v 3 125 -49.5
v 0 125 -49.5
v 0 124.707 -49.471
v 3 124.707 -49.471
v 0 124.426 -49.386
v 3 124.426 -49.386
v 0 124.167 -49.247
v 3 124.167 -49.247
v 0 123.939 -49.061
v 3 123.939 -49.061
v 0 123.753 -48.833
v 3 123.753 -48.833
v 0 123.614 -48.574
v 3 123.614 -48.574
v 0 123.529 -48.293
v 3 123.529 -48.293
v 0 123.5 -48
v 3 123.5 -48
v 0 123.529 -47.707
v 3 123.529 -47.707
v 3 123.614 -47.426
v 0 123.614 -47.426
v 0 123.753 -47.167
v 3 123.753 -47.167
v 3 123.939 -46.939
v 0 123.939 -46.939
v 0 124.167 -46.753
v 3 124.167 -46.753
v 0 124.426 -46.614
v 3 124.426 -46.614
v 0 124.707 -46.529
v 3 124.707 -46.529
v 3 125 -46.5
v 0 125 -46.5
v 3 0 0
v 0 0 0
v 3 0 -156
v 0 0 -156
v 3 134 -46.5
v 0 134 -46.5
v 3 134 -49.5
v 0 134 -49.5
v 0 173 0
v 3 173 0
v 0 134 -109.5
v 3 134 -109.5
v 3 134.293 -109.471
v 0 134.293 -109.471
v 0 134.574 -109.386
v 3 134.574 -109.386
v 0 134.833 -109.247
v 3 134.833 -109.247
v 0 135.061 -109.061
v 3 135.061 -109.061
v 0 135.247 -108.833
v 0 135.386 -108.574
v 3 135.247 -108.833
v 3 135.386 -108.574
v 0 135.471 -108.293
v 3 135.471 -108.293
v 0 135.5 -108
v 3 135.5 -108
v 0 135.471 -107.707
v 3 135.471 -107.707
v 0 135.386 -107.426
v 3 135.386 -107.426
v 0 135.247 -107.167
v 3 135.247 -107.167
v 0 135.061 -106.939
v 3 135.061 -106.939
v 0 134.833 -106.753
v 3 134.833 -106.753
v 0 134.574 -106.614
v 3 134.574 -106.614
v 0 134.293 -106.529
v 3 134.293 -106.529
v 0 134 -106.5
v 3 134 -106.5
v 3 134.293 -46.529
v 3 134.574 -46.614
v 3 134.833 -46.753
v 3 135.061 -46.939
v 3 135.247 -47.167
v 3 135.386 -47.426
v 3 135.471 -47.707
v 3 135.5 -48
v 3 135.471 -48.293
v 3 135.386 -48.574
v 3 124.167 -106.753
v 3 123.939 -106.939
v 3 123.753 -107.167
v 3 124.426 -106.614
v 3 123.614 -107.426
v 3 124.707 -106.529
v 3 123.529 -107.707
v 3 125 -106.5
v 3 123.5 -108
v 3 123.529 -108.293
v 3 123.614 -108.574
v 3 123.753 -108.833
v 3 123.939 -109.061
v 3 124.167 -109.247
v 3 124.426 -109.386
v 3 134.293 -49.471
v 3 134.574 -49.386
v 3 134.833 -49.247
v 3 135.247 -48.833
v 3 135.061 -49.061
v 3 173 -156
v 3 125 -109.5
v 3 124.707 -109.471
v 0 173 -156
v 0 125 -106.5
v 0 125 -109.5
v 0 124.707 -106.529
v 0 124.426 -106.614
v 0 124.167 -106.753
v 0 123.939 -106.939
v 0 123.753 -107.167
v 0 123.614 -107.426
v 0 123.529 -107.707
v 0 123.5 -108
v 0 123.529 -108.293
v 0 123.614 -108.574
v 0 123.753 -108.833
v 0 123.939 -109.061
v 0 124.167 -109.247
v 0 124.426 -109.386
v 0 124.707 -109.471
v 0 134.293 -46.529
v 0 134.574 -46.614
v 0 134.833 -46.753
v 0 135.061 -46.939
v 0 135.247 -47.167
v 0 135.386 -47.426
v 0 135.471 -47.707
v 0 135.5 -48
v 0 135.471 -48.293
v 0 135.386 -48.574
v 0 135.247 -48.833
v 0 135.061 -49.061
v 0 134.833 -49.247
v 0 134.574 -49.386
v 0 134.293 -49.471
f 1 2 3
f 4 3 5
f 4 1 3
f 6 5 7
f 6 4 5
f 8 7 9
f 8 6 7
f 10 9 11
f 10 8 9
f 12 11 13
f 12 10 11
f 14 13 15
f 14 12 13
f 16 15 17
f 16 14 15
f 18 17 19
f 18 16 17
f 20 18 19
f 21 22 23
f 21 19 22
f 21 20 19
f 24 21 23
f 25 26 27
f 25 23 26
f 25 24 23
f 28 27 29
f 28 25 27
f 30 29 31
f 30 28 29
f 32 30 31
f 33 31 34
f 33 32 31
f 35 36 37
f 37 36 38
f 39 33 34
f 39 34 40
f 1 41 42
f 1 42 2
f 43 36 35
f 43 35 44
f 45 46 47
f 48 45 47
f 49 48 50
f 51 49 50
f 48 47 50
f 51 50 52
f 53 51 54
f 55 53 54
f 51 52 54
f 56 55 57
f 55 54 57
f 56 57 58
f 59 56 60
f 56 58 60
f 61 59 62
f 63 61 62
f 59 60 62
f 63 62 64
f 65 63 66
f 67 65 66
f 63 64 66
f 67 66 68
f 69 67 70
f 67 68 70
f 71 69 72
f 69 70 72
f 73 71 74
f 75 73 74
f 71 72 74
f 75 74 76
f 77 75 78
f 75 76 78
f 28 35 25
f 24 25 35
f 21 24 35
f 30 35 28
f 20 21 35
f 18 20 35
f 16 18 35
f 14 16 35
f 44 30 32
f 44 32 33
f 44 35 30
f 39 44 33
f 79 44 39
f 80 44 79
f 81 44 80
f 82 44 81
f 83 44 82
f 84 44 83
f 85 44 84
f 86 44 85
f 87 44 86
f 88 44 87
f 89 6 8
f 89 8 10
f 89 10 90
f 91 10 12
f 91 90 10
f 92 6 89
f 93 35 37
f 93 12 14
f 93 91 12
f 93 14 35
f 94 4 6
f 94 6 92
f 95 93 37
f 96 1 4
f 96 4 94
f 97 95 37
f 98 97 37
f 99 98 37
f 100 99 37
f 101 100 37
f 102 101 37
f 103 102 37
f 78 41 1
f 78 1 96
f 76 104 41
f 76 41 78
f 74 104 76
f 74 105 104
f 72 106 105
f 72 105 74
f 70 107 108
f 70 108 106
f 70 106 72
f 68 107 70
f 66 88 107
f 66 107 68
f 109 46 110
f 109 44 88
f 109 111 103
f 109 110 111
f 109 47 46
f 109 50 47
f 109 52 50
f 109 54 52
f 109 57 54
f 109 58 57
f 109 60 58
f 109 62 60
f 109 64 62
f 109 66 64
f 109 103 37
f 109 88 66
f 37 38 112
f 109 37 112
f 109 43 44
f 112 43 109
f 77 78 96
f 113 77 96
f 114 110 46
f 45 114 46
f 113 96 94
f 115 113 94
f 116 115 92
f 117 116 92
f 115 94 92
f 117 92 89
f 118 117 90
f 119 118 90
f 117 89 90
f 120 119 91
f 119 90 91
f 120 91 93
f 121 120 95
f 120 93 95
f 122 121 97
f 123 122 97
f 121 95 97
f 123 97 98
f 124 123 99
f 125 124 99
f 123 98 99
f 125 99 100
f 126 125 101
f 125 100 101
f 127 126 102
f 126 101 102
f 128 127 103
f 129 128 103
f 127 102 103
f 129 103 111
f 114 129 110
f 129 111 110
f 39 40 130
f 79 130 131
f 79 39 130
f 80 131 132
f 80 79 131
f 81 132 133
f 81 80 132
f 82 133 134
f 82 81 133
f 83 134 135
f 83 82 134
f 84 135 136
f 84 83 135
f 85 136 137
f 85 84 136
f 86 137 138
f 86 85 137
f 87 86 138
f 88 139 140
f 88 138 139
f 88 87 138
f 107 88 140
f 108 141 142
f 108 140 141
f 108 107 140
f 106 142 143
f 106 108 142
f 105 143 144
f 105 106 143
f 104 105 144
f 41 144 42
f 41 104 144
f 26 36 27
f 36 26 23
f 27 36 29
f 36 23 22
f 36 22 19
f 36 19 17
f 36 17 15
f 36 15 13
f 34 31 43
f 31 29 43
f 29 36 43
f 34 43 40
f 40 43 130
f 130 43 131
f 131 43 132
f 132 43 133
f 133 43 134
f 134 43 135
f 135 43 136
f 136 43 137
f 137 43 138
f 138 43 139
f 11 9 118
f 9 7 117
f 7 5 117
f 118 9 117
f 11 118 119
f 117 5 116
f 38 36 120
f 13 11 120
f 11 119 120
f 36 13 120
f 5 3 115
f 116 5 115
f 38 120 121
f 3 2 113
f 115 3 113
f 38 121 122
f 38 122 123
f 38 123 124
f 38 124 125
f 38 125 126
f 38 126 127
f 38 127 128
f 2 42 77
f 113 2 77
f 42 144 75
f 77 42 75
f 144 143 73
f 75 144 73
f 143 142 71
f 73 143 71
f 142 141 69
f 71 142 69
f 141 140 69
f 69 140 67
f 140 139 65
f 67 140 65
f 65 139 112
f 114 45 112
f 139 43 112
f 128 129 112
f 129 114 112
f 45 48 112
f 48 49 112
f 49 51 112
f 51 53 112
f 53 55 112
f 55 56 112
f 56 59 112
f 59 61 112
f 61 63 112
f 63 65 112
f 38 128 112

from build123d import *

# Parameters (mm, degrees)
CROQUIS1_W              = 156
CROQUIS1_H              = 173
SALIENTE_EXTRUIR1_DEPTH = 3
CORTAR_EXTRUIR1_DEPTH   = 233.967808935


with BuildPart() as part:
    # Croquis1 → Saliente-Extruir1 (new body)
    with BuildSketch(Plane(origin=(0, 0, 0), x_dir=(0, 0, -1), z_dir=(1, 0, 0))):
        with Locations((78, 86.5)):
            Rectangle(CROQUIS1_W, CROQUIS1_H)
    extrude(amount=SALIENTE_EXTRUIR1_DEPTH)

    # Croquis2 → Cortar-Extruir1 (cut, through all)
    with BuildSketch(Plane(origin=(3, 0, 0), x_dir=(0, 0, -1), z_dir=(1, 0, 0))):
        with BuildLine():
            Line((46.5, 125), (46.5, 134))
            ThreePointArc((46.5, 134), (48, 135.5), (49.5, 134))
            Line((49.5, 134), (49.5, 125))
            ThreePointArc((49.5, 125), (48, 123.5), (46.5, 125))
        make_face()
        with BuildLine():
            Line((109.5, 125), (109.5, 134))
            ThreePointArc((109.5, 134), (108, 135.5), (106.5, 134))
            Line((106.5, 134), (106.5, 125))
            ThreePointArc((106.5, 125), (108, 123.5), (109.5, 125))
        make_face()
    extrude(amount=-CORTAR_EXTRUIR1_DEPTH, mode=Mode.SUBTRACT)


solid = part.part
